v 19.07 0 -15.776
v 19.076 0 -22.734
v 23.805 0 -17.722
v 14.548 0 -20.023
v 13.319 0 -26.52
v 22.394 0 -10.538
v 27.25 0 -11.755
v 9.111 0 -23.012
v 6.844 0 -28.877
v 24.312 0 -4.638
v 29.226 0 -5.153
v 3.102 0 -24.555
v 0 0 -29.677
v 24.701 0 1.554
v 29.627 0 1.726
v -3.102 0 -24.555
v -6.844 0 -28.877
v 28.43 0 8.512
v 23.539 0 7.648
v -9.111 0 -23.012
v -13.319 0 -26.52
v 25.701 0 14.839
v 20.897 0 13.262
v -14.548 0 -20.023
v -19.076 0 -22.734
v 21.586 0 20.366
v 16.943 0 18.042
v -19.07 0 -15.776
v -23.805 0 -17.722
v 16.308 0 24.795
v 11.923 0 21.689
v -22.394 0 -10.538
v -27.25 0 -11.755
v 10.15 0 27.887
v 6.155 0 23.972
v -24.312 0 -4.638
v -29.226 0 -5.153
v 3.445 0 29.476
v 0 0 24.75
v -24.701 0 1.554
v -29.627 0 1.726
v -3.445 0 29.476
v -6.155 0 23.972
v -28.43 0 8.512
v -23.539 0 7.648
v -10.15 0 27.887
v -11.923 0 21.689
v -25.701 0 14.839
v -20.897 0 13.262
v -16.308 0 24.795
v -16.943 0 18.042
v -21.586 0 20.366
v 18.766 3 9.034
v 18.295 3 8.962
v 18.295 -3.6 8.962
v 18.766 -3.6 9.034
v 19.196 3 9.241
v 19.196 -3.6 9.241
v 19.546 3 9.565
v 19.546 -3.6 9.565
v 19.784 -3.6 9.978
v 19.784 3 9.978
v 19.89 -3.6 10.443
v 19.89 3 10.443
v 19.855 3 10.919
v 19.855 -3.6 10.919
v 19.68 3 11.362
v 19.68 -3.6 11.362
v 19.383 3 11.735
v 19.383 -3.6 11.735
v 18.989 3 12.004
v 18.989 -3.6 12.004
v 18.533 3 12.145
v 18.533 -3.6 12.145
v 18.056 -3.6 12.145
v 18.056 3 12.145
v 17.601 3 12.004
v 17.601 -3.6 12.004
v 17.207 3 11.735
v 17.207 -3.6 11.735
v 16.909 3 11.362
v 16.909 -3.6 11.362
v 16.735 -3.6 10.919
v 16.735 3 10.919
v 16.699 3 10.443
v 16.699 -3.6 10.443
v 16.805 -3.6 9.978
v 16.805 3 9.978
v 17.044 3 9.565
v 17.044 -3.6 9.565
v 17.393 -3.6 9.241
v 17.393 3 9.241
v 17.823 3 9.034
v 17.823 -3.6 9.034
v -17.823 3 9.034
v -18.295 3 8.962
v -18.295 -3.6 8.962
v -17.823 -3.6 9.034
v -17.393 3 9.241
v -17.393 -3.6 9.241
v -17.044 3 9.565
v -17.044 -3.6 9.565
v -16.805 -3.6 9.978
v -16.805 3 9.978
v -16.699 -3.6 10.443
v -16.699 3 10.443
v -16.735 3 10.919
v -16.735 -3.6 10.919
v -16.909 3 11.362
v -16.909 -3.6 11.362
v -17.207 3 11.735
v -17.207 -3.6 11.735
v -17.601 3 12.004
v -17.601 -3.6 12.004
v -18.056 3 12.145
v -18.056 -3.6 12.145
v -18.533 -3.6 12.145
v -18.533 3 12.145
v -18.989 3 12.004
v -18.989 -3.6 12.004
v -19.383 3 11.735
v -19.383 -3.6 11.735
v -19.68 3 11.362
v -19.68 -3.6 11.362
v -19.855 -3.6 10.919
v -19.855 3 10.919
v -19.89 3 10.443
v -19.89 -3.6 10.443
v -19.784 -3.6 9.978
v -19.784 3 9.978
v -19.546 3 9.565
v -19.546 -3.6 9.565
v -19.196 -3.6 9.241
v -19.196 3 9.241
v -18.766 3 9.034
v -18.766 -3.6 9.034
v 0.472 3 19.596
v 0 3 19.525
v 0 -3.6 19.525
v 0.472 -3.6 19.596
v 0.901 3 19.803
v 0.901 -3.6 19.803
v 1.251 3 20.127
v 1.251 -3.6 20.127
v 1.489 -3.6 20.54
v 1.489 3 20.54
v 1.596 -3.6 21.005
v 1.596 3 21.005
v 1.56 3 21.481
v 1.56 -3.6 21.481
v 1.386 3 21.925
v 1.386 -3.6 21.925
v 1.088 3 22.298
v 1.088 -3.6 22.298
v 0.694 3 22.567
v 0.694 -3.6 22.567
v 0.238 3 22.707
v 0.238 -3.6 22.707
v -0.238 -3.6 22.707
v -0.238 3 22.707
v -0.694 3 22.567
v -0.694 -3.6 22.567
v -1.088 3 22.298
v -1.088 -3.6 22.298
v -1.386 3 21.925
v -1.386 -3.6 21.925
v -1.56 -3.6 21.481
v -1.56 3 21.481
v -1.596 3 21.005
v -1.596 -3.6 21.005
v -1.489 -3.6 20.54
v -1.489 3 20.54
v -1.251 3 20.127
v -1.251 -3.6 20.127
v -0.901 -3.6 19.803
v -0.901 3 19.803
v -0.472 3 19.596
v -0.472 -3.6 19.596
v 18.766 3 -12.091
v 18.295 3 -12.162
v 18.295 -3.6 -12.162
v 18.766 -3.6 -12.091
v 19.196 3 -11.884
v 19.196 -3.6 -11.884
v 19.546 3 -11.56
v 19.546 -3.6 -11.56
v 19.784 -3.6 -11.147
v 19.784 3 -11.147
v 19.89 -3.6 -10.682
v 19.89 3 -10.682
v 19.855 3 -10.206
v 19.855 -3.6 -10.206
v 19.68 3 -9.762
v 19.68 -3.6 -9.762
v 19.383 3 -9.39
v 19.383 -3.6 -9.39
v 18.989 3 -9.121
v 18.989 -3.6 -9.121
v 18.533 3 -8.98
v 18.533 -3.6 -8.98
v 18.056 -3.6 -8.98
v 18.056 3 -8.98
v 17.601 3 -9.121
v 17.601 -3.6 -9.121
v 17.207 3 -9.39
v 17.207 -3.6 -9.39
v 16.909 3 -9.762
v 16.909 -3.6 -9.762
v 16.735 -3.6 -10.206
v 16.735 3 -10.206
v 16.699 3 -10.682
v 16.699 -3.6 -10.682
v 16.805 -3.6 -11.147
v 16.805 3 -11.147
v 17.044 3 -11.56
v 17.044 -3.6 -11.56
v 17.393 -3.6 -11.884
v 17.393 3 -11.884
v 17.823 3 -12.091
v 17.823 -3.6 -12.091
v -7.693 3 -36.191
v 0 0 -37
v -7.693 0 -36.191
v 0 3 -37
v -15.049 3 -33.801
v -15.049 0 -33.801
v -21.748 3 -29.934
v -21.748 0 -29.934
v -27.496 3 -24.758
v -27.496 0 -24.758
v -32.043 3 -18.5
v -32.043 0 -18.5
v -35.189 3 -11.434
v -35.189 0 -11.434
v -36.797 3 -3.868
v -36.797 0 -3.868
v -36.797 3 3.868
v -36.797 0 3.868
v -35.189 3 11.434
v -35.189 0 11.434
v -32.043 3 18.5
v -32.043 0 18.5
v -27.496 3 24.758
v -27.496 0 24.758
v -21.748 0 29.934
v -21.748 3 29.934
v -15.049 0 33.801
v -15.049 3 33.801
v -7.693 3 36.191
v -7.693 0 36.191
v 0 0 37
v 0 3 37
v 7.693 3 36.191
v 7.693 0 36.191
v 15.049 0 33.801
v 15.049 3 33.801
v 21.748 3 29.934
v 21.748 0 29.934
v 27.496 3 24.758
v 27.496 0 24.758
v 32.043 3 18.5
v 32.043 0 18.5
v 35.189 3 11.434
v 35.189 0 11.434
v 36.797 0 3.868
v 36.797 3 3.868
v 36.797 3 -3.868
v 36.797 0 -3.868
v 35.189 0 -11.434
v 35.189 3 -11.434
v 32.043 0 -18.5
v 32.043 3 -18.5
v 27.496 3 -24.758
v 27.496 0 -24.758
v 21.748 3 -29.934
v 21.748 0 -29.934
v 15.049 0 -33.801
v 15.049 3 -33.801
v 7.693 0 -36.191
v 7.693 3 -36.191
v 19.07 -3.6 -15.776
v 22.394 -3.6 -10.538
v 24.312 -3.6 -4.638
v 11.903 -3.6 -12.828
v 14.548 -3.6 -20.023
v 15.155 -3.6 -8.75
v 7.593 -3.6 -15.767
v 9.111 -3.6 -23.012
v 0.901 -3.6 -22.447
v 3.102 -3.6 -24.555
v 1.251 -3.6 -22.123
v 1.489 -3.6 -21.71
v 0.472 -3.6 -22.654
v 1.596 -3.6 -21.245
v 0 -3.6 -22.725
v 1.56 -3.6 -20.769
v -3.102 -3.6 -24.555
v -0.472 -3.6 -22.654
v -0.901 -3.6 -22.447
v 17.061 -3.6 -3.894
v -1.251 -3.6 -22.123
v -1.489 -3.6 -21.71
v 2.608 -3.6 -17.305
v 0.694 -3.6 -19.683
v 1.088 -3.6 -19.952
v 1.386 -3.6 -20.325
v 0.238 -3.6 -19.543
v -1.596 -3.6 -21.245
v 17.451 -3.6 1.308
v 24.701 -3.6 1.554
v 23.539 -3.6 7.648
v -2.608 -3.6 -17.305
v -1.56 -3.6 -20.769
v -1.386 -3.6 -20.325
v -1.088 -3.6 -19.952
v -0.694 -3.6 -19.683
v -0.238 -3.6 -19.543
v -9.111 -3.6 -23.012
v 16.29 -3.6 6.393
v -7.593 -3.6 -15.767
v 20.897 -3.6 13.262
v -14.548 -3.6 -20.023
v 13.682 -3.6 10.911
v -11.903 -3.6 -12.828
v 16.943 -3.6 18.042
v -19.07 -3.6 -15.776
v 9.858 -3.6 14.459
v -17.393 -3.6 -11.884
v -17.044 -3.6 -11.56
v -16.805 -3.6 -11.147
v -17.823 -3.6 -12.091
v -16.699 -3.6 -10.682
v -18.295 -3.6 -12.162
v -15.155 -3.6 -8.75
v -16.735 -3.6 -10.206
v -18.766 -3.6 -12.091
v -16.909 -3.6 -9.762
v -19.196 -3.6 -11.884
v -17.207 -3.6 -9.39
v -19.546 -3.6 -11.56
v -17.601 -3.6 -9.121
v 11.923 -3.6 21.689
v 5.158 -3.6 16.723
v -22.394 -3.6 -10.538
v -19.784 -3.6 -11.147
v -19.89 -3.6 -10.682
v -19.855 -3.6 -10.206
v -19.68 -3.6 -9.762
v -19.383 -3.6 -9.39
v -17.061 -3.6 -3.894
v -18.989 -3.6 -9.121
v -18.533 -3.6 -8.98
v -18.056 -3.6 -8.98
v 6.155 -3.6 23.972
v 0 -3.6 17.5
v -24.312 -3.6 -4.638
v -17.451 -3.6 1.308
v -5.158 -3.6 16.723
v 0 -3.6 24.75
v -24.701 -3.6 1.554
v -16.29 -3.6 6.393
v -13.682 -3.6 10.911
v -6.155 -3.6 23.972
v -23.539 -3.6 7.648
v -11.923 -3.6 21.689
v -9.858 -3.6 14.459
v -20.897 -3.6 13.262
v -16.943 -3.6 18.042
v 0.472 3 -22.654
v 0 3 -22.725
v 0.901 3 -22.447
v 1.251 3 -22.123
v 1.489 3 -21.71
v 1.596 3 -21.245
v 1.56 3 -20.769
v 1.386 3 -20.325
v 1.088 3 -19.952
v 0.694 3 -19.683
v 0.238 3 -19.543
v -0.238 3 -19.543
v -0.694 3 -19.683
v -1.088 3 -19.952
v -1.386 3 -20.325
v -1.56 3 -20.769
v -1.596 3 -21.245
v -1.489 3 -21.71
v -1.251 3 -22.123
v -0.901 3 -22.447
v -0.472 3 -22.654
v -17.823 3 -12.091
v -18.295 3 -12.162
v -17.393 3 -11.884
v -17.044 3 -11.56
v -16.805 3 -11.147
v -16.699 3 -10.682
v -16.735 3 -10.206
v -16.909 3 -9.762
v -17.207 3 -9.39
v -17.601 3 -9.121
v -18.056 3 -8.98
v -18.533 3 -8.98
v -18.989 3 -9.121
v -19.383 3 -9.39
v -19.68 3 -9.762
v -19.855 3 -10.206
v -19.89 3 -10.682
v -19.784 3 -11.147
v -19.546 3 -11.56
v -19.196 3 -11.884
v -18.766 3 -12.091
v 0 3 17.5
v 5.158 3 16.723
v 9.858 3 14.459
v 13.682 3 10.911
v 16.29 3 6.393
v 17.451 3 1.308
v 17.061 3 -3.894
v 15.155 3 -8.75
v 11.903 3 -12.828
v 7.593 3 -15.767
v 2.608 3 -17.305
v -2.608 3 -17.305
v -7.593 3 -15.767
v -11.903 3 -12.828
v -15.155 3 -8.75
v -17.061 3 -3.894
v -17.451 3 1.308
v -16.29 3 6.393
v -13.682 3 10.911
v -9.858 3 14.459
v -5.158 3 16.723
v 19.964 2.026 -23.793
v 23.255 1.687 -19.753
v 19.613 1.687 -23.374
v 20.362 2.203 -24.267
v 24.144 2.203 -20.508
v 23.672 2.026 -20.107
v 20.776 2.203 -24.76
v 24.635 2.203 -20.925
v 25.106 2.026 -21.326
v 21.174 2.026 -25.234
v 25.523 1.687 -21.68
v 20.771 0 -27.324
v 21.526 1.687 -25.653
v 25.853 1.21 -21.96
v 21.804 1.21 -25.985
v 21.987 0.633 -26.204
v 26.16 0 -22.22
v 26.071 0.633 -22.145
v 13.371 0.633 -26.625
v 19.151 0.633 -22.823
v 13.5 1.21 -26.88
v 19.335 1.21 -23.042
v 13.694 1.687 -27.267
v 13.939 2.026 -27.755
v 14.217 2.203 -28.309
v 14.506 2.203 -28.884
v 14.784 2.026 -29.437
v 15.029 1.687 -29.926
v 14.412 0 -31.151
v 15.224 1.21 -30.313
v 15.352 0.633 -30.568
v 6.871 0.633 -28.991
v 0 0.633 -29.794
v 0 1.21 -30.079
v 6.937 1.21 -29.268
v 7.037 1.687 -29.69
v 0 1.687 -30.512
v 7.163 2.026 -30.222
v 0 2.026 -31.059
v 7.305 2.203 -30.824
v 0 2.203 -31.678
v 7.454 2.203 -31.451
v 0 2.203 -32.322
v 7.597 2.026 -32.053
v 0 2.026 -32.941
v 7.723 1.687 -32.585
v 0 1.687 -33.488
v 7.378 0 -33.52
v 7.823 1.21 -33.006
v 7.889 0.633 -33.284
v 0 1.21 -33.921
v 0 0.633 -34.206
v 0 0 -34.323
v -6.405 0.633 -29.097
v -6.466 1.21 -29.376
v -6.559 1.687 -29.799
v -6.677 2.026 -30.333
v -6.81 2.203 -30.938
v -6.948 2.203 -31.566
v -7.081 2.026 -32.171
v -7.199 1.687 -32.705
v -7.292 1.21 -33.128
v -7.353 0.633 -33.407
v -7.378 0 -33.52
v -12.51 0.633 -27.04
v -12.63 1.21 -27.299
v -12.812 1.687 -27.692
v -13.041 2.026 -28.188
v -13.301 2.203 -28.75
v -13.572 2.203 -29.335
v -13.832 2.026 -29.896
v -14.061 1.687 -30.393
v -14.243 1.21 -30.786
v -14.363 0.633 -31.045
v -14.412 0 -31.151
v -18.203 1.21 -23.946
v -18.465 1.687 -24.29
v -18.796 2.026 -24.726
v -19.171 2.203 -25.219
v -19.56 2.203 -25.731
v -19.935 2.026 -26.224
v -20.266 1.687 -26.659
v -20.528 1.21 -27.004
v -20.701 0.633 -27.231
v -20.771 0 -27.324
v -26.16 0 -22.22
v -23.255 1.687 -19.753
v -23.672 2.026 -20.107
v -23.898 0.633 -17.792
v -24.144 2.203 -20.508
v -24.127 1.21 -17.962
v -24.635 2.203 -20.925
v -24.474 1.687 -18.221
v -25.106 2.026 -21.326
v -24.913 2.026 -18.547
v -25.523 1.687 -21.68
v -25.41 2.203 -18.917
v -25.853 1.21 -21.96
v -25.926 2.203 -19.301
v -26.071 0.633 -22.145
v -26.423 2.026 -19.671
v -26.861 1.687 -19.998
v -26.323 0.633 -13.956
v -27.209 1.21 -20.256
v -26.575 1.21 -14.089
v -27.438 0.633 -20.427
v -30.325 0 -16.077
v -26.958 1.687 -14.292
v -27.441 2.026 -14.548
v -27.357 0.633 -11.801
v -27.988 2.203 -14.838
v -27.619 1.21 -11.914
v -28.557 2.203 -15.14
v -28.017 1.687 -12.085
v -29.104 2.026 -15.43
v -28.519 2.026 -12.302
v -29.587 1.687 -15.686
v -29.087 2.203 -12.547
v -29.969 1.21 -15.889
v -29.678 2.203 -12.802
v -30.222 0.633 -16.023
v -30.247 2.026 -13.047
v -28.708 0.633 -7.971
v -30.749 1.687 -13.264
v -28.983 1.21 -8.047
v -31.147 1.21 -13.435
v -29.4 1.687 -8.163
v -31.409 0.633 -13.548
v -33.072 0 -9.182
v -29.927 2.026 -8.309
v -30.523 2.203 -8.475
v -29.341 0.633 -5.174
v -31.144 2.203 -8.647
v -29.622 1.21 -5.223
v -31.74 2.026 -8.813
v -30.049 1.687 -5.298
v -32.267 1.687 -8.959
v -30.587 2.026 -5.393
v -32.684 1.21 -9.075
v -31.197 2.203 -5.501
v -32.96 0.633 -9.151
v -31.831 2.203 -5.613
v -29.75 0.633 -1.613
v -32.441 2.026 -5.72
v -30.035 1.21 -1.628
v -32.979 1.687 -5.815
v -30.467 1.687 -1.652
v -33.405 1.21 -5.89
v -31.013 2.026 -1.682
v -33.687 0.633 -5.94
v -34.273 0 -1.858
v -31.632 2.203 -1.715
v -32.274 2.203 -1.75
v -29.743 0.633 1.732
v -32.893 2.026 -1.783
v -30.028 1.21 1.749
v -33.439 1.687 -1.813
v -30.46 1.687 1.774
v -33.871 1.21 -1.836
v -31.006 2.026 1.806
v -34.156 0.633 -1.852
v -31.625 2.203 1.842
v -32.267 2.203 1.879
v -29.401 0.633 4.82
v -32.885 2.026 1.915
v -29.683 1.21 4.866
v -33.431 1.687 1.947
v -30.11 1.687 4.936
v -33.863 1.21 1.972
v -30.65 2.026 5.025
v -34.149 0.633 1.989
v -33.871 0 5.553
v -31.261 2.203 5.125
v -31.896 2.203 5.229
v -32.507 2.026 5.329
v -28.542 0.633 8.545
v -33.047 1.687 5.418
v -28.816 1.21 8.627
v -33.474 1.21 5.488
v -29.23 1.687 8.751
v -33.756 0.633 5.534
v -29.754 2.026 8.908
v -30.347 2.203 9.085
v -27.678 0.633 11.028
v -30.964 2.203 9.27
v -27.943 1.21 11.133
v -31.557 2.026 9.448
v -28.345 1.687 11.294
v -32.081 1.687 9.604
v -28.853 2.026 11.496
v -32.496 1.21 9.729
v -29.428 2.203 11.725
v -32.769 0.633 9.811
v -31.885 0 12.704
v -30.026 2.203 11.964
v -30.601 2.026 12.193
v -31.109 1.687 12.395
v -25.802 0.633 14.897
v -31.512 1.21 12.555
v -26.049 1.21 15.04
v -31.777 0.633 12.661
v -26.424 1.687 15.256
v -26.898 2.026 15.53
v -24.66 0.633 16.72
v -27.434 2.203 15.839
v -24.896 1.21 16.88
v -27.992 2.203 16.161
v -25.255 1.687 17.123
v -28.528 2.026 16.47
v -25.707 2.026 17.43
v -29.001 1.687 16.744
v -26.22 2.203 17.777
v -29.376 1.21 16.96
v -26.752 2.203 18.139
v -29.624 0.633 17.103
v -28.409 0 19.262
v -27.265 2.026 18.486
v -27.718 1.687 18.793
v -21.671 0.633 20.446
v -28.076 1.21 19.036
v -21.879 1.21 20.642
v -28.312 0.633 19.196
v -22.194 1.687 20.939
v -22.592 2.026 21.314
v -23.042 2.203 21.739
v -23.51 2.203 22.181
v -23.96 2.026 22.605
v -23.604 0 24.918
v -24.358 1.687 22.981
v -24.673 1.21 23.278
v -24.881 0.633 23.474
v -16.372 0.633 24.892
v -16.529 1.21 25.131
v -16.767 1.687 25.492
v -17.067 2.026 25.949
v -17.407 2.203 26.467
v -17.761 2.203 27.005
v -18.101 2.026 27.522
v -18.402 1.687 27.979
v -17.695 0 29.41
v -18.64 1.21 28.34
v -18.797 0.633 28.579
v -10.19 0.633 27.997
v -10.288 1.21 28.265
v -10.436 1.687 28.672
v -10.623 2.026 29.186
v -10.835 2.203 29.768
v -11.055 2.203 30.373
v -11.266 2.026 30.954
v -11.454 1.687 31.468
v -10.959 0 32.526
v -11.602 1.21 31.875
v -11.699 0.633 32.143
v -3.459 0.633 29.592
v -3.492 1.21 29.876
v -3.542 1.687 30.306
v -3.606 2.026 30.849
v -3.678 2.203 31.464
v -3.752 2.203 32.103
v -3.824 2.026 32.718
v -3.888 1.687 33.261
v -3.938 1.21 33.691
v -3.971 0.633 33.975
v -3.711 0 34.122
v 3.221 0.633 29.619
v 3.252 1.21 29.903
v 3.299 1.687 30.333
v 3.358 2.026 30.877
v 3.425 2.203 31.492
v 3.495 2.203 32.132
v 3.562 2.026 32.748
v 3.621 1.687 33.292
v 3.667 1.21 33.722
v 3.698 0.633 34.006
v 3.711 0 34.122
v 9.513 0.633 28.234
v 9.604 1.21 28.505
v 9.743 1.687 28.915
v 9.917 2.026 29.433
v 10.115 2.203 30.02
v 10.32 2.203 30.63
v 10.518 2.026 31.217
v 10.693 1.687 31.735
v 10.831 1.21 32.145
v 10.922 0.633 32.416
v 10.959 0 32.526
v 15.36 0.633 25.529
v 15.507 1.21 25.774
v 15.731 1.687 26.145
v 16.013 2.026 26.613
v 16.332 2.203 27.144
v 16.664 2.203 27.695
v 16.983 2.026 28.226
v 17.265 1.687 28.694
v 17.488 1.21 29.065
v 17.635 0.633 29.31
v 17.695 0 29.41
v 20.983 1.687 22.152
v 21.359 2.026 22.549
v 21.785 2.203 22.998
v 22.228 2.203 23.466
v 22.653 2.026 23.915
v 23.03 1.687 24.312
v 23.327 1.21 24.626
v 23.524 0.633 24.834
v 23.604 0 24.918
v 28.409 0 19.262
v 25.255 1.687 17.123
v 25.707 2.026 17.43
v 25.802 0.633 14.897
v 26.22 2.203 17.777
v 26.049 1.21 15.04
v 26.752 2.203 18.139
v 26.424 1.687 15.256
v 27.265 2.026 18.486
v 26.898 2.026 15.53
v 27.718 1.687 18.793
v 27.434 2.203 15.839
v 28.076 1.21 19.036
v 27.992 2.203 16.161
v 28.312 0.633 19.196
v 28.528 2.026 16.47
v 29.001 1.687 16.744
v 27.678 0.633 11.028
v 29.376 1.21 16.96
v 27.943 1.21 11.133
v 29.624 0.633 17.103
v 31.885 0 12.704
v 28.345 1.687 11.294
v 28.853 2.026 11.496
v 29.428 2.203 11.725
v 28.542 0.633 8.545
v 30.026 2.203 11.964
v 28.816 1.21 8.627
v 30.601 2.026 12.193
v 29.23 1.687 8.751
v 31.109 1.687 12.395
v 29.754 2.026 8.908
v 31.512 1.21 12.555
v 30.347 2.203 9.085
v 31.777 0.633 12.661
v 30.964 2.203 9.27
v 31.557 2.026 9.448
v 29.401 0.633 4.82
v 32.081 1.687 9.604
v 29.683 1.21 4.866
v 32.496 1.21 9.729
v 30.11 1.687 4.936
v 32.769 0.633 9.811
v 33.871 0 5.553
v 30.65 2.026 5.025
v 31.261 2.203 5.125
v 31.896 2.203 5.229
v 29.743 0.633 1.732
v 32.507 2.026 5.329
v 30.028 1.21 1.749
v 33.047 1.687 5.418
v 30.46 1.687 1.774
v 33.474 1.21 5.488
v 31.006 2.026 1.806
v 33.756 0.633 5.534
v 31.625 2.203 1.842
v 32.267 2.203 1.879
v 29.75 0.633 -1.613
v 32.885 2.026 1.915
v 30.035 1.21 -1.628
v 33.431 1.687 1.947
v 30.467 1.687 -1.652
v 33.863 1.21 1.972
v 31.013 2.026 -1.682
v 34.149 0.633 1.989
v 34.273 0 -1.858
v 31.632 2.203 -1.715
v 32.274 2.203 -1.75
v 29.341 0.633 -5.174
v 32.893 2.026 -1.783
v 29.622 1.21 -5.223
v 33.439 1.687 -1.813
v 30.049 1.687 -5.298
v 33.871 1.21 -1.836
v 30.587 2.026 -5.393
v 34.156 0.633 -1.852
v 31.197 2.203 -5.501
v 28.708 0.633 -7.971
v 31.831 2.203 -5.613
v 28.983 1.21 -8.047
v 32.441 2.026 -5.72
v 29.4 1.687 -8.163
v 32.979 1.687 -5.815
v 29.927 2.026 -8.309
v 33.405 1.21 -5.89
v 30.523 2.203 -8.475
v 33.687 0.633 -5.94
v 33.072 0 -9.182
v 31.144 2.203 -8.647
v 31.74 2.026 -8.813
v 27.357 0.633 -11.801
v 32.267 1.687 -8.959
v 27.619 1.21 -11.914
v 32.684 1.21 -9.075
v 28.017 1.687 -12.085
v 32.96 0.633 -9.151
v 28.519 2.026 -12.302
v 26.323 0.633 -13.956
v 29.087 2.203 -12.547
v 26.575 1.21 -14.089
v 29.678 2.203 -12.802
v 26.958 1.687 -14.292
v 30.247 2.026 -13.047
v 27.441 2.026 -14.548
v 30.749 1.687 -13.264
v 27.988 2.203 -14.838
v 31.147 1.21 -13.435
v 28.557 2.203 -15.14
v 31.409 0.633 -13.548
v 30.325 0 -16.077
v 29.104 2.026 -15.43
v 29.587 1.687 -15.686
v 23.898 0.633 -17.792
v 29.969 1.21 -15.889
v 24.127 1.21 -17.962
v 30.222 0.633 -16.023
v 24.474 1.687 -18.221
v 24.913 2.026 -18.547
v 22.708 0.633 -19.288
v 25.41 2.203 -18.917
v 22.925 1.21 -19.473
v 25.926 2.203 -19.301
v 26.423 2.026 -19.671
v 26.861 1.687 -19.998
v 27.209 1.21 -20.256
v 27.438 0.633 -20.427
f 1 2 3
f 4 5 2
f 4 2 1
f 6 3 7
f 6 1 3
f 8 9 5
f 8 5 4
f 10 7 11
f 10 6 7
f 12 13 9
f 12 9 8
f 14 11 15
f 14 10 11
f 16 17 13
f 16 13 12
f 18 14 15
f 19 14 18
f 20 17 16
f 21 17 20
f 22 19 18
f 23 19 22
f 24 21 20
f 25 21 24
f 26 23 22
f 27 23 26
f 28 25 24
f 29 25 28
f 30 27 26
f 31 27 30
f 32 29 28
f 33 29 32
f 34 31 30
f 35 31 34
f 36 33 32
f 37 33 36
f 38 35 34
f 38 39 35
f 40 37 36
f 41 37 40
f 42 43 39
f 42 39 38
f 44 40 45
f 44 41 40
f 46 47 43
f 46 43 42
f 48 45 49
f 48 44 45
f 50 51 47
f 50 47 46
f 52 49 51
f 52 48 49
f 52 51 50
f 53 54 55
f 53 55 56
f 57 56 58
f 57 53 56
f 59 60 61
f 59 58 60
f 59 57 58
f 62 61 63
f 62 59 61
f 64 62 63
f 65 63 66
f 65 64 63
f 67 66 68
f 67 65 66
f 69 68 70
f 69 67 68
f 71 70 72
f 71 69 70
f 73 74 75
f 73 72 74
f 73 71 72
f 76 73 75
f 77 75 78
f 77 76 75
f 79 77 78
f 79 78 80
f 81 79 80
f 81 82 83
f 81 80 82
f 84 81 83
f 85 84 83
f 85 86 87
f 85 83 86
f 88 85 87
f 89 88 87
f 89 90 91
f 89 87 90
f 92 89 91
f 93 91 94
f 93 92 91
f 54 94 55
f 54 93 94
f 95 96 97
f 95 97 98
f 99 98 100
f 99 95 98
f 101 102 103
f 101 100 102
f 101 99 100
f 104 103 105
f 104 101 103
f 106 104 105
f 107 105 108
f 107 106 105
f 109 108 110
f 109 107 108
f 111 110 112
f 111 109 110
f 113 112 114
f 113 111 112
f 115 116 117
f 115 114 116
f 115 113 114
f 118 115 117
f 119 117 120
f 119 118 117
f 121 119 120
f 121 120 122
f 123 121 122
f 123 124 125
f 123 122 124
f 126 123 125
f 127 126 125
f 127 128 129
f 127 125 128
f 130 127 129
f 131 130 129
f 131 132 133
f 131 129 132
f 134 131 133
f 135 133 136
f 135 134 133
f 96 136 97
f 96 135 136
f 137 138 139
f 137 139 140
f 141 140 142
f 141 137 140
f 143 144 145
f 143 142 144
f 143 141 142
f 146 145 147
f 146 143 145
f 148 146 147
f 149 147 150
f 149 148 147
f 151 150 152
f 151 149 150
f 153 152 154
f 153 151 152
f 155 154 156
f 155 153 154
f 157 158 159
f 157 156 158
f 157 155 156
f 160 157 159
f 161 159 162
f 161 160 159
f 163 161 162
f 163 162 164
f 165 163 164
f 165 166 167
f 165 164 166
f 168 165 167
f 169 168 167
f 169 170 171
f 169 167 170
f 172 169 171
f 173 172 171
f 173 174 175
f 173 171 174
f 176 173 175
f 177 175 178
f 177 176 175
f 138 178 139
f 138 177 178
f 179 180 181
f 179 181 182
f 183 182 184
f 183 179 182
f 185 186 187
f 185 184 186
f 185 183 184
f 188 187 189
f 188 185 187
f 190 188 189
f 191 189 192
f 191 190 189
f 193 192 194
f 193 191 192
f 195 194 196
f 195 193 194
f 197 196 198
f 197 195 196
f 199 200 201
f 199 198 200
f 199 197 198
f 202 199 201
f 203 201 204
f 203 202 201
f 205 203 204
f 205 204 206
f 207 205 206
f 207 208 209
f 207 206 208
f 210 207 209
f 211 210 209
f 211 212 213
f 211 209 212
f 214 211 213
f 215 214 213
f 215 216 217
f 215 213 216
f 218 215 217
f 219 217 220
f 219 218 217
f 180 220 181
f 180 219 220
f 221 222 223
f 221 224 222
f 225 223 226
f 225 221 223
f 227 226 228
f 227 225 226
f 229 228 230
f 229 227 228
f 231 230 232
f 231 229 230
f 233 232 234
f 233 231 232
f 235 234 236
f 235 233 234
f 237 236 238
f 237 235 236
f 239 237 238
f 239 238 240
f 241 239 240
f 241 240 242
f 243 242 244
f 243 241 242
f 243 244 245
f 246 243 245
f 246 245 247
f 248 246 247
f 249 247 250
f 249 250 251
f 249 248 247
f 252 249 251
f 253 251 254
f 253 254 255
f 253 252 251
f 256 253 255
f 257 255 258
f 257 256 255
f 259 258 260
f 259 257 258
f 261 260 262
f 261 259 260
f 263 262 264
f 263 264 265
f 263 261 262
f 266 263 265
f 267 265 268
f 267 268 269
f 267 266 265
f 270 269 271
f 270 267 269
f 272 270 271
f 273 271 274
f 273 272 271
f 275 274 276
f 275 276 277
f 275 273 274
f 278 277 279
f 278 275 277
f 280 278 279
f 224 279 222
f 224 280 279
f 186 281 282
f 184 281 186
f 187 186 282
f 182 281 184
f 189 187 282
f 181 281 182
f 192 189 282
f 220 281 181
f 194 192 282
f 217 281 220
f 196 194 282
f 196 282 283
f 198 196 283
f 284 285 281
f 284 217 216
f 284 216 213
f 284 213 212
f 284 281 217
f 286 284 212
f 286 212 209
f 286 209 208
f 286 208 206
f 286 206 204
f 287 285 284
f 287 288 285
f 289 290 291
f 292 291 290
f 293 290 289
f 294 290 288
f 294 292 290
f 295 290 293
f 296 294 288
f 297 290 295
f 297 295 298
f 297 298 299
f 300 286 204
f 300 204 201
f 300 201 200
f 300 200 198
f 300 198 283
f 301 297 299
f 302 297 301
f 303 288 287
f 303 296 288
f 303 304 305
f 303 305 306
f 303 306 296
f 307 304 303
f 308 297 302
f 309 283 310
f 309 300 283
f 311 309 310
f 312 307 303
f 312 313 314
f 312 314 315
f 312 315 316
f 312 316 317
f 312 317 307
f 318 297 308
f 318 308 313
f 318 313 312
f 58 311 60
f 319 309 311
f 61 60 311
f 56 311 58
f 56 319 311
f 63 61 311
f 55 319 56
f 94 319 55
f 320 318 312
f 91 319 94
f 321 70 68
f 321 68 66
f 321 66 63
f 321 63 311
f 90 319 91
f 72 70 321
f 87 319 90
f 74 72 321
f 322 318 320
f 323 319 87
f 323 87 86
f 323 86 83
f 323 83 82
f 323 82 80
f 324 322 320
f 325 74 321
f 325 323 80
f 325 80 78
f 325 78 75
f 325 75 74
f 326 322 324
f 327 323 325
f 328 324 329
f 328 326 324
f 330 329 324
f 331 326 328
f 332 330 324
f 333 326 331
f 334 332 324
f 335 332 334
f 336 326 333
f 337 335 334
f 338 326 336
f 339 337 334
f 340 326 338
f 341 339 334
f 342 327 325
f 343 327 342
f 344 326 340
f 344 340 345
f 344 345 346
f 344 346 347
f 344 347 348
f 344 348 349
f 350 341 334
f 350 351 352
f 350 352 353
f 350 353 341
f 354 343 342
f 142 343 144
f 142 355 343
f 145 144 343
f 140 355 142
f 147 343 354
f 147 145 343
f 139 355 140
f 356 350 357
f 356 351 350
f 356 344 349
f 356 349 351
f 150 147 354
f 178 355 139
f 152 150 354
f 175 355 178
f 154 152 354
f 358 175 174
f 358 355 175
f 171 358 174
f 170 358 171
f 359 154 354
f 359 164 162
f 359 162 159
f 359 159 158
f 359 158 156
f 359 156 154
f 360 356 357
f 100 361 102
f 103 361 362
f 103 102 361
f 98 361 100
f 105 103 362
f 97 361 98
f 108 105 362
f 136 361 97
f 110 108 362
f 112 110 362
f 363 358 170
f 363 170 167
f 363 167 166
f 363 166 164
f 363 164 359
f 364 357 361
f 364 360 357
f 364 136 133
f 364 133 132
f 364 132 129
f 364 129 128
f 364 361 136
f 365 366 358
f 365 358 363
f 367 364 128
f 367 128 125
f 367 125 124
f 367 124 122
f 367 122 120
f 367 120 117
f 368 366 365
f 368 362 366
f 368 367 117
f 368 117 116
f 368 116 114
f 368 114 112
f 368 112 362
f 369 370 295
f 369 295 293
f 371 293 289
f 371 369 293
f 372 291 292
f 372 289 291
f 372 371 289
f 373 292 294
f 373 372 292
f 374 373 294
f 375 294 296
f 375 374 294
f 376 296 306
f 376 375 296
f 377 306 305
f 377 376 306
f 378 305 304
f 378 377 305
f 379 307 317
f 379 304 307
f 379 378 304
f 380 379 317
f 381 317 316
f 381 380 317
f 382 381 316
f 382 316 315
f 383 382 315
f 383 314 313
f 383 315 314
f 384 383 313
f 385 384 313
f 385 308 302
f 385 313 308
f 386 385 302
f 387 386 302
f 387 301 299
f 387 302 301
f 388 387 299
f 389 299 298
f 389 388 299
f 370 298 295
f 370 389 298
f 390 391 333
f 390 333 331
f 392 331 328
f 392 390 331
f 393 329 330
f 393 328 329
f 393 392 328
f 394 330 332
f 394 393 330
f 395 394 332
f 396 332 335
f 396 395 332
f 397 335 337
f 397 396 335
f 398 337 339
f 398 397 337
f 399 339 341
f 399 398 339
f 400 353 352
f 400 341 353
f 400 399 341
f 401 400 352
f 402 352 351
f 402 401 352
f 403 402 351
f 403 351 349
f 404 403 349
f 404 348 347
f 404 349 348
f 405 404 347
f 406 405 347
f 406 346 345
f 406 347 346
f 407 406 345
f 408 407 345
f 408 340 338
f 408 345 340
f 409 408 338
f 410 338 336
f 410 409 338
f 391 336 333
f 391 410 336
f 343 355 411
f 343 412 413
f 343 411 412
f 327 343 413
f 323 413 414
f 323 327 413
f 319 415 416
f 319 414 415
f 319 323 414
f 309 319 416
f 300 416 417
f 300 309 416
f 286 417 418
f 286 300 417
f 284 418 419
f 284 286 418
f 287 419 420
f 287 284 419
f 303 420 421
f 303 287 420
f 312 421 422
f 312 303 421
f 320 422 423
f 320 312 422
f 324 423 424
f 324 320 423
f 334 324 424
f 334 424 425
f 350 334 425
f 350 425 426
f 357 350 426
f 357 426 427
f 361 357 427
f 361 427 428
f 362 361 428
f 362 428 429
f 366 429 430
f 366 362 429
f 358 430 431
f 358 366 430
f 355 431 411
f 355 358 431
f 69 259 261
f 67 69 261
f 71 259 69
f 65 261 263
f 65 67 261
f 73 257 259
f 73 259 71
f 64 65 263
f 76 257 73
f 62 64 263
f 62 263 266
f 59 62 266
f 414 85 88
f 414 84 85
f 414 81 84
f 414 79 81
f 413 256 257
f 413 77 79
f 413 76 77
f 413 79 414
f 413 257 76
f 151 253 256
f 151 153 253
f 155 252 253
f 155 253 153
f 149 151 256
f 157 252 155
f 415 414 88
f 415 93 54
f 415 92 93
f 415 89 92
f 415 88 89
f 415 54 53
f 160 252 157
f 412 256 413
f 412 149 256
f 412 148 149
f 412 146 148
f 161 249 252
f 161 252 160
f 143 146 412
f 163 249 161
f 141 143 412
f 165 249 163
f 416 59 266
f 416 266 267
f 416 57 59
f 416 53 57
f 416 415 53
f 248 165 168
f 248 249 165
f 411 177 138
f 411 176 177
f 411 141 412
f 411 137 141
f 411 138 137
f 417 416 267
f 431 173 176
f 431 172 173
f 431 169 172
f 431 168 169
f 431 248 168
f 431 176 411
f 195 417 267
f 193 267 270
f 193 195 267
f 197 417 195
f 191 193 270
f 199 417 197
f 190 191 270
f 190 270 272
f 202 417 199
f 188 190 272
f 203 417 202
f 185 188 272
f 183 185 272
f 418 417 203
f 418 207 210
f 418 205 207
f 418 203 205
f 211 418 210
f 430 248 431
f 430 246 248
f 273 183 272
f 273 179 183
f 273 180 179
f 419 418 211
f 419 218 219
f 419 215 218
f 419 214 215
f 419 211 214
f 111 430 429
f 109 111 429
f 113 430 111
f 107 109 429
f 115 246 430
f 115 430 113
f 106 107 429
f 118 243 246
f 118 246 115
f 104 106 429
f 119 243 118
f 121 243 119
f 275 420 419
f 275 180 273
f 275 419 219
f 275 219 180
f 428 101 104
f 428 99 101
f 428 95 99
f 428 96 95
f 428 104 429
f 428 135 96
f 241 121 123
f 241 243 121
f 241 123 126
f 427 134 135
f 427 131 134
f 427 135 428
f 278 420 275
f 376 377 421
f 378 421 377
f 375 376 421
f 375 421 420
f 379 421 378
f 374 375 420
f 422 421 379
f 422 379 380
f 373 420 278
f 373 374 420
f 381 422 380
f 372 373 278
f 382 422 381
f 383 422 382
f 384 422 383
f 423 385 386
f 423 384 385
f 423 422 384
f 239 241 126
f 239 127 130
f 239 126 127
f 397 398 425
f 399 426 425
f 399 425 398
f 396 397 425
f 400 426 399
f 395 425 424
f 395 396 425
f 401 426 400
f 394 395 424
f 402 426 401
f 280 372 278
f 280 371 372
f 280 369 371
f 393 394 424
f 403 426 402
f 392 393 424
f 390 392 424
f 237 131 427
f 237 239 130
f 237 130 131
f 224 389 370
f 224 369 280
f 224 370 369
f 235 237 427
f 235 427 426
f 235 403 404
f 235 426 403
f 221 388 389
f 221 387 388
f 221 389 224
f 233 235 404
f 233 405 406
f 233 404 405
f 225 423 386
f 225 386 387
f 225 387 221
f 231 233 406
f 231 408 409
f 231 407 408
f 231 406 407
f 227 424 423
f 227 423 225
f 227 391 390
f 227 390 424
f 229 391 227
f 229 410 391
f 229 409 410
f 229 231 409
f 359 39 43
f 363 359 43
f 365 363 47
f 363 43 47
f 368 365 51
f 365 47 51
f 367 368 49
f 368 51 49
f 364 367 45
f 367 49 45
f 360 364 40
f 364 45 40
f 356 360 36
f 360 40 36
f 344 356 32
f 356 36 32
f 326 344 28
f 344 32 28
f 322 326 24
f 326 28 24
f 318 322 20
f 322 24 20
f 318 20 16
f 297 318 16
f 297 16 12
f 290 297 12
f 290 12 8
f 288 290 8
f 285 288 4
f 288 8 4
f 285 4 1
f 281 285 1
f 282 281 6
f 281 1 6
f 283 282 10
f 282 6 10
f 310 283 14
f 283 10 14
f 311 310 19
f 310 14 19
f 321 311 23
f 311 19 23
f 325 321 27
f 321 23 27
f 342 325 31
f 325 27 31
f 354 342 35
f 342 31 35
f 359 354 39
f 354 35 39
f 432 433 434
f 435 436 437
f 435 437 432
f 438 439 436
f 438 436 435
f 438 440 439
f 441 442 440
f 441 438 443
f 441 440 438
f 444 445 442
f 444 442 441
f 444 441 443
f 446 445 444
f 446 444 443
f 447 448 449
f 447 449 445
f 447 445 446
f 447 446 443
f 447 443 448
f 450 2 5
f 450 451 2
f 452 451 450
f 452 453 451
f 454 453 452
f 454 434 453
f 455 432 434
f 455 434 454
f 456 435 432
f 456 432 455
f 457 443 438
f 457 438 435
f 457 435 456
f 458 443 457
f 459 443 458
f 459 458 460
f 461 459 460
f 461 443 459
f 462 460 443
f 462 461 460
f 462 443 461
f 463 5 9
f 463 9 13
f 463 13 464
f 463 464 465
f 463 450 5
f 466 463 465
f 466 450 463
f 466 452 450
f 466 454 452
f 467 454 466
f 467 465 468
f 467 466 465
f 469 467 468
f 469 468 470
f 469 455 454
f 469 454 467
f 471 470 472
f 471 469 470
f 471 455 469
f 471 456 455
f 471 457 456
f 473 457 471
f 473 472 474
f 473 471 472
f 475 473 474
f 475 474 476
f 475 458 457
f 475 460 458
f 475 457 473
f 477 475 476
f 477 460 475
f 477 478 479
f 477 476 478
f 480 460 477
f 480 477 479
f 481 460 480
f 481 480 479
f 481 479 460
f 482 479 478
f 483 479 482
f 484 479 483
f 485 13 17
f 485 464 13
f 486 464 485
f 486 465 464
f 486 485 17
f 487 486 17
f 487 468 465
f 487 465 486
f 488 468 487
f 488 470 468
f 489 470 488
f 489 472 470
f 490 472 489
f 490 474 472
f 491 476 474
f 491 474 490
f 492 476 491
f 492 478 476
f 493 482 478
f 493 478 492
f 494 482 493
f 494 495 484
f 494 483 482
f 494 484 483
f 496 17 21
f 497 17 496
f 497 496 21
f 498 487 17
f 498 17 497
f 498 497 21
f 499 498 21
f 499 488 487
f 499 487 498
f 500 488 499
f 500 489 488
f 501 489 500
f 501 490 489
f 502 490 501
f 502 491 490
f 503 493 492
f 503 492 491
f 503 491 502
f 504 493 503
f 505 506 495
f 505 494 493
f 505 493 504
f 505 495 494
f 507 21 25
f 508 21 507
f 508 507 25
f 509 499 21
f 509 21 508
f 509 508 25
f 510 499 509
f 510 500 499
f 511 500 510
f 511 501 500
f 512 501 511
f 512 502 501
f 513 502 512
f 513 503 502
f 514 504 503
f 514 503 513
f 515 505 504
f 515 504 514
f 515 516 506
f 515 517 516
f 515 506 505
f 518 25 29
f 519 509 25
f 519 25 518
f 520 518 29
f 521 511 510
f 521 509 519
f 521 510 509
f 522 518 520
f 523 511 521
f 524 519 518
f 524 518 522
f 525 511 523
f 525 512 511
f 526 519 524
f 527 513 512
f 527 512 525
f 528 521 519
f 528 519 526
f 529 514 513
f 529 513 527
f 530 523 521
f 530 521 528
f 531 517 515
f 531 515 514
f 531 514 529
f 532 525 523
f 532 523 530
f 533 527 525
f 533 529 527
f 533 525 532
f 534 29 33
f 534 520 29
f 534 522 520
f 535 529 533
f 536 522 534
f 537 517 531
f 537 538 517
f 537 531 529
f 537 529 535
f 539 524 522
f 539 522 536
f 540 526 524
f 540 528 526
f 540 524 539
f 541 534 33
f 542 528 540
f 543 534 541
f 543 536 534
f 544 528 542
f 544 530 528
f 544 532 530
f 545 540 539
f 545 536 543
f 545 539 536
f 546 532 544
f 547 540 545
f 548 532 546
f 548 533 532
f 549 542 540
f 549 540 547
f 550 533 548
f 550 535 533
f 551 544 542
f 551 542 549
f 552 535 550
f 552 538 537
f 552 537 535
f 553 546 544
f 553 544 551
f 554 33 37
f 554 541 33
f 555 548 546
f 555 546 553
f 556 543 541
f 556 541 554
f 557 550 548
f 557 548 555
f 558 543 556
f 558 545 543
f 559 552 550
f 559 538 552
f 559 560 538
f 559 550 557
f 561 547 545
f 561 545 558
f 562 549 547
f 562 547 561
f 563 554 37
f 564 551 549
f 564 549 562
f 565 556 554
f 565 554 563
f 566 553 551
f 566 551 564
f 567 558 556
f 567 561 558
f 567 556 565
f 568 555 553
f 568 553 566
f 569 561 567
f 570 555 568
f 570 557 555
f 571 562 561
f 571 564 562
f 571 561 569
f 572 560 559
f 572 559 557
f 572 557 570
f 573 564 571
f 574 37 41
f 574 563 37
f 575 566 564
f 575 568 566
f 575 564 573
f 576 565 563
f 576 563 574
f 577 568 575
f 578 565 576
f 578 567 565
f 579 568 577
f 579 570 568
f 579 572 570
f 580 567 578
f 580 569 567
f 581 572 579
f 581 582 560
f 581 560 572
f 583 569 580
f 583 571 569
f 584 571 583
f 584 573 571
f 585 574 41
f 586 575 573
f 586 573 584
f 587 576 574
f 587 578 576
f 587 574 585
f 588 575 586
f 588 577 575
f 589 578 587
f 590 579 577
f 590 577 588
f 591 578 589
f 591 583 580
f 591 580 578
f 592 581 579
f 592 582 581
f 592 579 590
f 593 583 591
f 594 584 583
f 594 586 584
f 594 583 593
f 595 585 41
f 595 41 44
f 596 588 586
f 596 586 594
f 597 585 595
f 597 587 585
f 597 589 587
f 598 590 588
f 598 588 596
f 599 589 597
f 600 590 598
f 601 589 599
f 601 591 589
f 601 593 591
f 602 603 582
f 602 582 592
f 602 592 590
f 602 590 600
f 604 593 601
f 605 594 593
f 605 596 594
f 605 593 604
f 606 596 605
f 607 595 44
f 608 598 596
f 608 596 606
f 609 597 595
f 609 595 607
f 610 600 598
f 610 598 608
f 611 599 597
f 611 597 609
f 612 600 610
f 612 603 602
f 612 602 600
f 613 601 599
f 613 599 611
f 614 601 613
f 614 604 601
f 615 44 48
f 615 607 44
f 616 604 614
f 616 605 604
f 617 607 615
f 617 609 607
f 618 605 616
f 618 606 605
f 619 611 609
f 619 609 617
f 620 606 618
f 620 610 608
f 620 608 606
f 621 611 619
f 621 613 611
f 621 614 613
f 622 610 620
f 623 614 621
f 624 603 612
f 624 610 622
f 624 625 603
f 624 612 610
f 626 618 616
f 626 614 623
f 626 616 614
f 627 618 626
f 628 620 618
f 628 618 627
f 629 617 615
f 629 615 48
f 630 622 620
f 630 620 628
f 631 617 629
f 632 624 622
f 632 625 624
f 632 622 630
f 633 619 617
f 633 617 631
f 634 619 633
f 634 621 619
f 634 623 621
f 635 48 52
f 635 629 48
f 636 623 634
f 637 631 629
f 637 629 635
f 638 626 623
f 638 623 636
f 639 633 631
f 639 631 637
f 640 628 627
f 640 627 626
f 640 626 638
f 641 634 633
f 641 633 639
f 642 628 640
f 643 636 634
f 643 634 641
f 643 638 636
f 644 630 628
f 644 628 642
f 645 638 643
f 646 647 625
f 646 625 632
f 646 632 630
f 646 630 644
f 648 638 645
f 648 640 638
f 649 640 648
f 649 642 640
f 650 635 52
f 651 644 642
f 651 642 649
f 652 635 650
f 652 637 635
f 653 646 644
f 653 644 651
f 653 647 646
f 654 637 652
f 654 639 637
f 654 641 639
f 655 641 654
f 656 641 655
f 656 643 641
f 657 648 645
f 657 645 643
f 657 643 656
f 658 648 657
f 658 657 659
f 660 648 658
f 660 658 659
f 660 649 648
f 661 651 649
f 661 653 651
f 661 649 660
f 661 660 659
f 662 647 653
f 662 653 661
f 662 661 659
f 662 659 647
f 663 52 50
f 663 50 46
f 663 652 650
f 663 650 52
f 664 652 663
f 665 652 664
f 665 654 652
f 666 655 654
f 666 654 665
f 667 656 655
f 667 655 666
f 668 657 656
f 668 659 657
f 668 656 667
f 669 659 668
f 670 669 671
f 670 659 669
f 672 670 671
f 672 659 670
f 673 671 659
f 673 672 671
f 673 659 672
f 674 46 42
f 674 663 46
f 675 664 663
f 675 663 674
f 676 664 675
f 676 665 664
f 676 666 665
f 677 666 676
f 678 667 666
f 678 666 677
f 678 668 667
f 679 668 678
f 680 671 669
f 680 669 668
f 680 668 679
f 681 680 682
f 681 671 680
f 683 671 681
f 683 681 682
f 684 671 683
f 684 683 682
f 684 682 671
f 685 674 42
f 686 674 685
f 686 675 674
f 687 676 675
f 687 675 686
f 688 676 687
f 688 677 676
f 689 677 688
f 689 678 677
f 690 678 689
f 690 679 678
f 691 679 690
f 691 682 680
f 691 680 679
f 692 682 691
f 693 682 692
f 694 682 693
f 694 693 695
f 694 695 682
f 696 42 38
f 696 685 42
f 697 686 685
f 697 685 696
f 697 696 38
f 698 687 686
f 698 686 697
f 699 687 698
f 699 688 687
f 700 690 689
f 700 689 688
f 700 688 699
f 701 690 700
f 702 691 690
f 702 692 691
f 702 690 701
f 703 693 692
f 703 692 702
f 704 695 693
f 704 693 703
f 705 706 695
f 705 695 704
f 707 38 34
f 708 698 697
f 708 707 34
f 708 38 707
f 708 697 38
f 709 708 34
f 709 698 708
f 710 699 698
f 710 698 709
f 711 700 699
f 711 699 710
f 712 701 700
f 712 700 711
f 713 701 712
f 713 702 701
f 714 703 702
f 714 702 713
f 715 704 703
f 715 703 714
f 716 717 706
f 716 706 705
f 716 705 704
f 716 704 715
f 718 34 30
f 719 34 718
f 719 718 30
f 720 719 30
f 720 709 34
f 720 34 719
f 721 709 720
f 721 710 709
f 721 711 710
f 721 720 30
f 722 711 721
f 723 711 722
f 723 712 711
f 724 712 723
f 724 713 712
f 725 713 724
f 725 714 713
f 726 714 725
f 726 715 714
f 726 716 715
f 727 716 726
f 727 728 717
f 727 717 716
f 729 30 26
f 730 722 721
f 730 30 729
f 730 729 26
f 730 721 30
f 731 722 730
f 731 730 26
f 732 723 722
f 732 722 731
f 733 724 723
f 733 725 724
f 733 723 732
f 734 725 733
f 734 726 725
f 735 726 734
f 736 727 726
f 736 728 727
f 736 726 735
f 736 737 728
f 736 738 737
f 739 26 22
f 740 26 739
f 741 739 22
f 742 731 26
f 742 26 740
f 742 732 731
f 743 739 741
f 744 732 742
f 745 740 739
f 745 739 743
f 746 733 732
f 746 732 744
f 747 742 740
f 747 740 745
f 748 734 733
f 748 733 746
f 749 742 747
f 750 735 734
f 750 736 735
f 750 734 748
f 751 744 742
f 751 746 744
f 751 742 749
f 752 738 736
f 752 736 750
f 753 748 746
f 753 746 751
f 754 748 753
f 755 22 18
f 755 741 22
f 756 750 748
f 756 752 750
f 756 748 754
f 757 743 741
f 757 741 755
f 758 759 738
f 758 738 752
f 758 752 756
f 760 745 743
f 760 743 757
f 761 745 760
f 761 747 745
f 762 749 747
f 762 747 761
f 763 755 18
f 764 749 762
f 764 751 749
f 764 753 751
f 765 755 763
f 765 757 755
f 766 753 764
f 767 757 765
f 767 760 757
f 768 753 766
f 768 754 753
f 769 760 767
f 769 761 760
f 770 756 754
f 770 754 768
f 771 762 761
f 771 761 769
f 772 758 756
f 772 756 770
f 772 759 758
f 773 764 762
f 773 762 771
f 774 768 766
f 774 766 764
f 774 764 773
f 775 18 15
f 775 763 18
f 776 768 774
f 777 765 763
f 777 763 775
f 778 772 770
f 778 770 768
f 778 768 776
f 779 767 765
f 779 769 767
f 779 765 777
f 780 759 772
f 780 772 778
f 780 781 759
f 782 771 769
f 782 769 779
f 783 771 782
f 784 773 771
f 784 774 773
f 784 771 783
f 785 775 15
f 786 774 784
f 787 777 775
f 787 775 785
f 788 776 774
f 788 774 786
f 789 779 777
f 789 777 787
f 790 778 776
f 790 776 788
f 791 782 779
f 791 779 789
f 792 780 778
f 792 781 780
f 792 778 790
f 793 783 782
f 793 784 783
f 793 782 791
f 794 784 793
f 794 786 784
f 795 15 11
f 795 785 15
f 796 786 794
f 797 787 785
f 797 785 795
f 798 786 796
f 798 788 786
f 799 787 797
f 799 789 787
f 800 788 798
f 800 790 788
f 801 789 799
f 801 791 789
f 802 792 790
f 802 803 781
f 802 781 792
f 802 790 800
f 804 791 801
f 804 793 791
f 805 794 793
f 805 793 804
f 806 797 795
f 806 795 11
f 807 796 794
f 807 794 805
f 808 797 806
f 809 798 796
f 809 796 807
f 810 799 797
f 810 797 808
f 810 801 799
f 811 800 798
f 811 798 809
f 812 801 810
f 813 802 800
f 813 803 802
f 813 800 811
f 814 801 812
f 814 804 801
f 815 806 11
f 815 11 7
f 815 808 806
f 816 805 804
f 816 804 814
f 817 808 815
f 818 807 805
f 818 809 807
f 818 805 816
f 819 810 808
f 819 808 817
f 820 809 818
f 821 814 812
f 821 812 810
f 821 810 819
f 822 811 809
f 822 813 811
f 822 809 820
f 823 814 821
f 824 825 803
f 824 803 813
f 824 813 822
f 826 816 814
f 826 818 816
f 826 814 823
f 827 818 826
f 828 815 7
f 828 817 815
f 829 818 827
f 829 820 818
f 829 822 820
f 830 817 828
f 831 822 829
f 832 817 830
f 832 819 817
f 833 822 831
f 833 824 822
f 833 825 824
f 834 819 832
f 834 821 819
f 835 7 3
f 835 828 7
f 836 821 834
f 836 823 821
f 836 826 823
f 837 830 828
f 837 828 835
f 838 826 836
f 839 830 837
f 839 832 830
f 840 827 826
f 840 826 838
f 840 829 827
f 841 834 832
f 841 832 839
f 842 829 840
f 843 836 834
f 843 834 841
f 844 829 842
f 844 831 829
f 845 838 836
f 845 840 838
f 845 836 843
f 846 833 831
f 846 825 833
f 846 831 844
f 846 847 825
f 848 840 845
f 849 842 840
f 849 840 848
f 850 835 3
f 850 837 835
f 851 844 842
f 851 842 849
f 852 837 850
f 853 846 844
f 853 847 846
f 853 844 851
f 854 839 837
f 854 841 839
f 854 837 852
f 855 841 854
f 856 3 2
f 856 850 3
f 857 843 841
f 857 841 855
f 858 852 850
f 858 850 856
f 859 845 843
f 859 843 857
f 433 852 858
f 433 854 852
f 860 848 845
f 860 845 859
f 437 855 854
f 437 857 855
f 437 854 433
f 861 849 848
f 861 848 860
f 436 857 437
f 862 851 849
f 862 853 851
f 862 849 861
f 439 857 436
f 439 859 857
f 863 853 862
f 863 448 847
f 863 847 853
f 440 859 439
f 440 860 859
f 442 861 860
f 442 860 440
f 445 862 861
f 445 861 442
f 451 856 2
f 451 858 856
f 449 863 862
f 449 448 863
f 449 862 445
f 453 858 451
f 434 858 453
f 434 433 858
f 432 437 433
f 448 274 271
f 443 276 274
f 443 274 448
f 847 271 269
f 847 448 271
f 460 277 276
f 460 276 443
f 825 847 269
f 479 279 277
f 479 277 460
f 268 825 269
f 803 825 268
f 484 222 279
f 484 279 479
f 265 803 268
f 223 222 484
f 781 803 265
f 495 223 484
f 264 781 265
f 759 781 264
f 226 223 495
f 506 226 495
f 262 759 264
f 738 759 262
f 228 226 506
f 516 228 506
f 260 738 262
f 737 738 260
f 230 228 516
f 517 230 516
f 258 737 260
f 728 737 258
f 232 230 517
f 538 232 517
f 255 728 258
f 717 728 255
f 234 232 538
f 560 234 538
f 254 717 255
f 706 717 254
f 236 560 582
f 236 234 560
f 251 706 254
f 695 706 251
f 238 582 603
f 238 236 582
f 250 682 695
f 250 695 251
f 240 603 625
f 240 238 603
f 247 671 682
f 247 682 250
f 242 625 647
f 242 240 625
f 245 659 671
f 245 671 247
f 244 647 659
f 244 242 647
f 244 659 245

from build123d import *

# Parameters (mm, degrees)
SKETCH3_R               = 24.75
BOSS_EXTRUDE1_DEPTH     = 3.6
CUT_EXTRUDE1_DEPTH      = 53.740496774
CUT_EXTRUDE1_DEPTH_BACK = 53.740496774
SKETCH4_R               = 17.5
CUT_EXTRUDE2_DEPTH      = 53.740496774
CUT_EXTRUDE2_DEPTH_BACK = 53.740496774
SKETCH5_R               = 1.6


with BuildPart() as part:
    # Sketch2 → Revolve1 (revolve)
    with BuildSketch(Plane.XY, mode=Mode.PRIVATE) as revolve1_sk:
        with BuildLine():
            Line((-34.322848467, 0), (-37, 0))
            Line((-37, 0), (-37, 3))
            Line((-37, 3), (0, 3))
            Line((0, 3), (0, 0))
            Line((0, 0), (-29.677151533, 0))
            ThreePointArc((-29.677151533, 0), (-32, 2.225), (-34.322848467, 0))
        make_face()
    revolve(revolve1_sk.sketch.rotate(Axis((0, 0, 0), (0, 1, 0)), 270), axis=Axis((0, 0, 0), (0, 1, 0)))

    # Sketch3 → Boss-Extrude1 (add)
    with BuildSketch(Plane.XZ):
        with Locations(Location((0, 0, 0), (0, 0, 90))):
            Circle(SKETCH3_R)
    extrude(amount=BOSS_EXTRUDE1_DEPTH)

    # Sketch4 → Cut-Extrude1 (cut, two sides: drawn at the far end of the back side and taken through both)
    with BuildSketch(Plane(origin=(0, 3, 0), x_dir=(1, 0, 0), z_dir=(0, 1, 0)).offset(-CUT_EXTRUDE1_DEPTH_BACK)):
        with Locations(Location((0, 0, 0), (0, 0, 270))):
            Circle(SKETCH4_R)
    extrude(amount=CUT_EXTRUDE1_DEPTH + CUT_EXTRUDE1_DEPTH_BACK, mode=Mode.SUBTRACT)

    # Sketch5 → Cut-Extrude2 (cut, two sides: drawn at the far end of the back side and taken through both)
    with BuildSketch(Plane.XZ.offset(3.6).offset(-CUT_EXTRUDE2_DEPTH_BACK)):
        with Locations(Location((-18.294786655, 10.5625, 0), (0, 0, 270))):
            Circle(SKETCH5_R)
        with Locations(Location((-18.294786655, -10.5625, 0), (0, 0, 270))):
            Circle(SKETCH5_R)
        with Locations(Location((0, -21.125, 0), (0, 0, 270))):
            Circle(SKETCH5_R)
        with Locations(Location((0, 21.125, 0), (0, 0, 270))):
            Circle(SKETCH5_R)
        with Locations(Location((18.294786655, -10.5625, 0), (0, 0, 270))):
            Circle(SKETCH5_R)
        with Locations(Location((18.294786655, 10.5625, 0), (0, 0, 270))):
            Circle(SKETCH5_R)
    extrude(amount=CUT_EXTRUDE2_DEPTH + CUT_EXTRUDE2_DEPTH_BACK, mode=Mode.SUBTRACT)


solid = part.part
